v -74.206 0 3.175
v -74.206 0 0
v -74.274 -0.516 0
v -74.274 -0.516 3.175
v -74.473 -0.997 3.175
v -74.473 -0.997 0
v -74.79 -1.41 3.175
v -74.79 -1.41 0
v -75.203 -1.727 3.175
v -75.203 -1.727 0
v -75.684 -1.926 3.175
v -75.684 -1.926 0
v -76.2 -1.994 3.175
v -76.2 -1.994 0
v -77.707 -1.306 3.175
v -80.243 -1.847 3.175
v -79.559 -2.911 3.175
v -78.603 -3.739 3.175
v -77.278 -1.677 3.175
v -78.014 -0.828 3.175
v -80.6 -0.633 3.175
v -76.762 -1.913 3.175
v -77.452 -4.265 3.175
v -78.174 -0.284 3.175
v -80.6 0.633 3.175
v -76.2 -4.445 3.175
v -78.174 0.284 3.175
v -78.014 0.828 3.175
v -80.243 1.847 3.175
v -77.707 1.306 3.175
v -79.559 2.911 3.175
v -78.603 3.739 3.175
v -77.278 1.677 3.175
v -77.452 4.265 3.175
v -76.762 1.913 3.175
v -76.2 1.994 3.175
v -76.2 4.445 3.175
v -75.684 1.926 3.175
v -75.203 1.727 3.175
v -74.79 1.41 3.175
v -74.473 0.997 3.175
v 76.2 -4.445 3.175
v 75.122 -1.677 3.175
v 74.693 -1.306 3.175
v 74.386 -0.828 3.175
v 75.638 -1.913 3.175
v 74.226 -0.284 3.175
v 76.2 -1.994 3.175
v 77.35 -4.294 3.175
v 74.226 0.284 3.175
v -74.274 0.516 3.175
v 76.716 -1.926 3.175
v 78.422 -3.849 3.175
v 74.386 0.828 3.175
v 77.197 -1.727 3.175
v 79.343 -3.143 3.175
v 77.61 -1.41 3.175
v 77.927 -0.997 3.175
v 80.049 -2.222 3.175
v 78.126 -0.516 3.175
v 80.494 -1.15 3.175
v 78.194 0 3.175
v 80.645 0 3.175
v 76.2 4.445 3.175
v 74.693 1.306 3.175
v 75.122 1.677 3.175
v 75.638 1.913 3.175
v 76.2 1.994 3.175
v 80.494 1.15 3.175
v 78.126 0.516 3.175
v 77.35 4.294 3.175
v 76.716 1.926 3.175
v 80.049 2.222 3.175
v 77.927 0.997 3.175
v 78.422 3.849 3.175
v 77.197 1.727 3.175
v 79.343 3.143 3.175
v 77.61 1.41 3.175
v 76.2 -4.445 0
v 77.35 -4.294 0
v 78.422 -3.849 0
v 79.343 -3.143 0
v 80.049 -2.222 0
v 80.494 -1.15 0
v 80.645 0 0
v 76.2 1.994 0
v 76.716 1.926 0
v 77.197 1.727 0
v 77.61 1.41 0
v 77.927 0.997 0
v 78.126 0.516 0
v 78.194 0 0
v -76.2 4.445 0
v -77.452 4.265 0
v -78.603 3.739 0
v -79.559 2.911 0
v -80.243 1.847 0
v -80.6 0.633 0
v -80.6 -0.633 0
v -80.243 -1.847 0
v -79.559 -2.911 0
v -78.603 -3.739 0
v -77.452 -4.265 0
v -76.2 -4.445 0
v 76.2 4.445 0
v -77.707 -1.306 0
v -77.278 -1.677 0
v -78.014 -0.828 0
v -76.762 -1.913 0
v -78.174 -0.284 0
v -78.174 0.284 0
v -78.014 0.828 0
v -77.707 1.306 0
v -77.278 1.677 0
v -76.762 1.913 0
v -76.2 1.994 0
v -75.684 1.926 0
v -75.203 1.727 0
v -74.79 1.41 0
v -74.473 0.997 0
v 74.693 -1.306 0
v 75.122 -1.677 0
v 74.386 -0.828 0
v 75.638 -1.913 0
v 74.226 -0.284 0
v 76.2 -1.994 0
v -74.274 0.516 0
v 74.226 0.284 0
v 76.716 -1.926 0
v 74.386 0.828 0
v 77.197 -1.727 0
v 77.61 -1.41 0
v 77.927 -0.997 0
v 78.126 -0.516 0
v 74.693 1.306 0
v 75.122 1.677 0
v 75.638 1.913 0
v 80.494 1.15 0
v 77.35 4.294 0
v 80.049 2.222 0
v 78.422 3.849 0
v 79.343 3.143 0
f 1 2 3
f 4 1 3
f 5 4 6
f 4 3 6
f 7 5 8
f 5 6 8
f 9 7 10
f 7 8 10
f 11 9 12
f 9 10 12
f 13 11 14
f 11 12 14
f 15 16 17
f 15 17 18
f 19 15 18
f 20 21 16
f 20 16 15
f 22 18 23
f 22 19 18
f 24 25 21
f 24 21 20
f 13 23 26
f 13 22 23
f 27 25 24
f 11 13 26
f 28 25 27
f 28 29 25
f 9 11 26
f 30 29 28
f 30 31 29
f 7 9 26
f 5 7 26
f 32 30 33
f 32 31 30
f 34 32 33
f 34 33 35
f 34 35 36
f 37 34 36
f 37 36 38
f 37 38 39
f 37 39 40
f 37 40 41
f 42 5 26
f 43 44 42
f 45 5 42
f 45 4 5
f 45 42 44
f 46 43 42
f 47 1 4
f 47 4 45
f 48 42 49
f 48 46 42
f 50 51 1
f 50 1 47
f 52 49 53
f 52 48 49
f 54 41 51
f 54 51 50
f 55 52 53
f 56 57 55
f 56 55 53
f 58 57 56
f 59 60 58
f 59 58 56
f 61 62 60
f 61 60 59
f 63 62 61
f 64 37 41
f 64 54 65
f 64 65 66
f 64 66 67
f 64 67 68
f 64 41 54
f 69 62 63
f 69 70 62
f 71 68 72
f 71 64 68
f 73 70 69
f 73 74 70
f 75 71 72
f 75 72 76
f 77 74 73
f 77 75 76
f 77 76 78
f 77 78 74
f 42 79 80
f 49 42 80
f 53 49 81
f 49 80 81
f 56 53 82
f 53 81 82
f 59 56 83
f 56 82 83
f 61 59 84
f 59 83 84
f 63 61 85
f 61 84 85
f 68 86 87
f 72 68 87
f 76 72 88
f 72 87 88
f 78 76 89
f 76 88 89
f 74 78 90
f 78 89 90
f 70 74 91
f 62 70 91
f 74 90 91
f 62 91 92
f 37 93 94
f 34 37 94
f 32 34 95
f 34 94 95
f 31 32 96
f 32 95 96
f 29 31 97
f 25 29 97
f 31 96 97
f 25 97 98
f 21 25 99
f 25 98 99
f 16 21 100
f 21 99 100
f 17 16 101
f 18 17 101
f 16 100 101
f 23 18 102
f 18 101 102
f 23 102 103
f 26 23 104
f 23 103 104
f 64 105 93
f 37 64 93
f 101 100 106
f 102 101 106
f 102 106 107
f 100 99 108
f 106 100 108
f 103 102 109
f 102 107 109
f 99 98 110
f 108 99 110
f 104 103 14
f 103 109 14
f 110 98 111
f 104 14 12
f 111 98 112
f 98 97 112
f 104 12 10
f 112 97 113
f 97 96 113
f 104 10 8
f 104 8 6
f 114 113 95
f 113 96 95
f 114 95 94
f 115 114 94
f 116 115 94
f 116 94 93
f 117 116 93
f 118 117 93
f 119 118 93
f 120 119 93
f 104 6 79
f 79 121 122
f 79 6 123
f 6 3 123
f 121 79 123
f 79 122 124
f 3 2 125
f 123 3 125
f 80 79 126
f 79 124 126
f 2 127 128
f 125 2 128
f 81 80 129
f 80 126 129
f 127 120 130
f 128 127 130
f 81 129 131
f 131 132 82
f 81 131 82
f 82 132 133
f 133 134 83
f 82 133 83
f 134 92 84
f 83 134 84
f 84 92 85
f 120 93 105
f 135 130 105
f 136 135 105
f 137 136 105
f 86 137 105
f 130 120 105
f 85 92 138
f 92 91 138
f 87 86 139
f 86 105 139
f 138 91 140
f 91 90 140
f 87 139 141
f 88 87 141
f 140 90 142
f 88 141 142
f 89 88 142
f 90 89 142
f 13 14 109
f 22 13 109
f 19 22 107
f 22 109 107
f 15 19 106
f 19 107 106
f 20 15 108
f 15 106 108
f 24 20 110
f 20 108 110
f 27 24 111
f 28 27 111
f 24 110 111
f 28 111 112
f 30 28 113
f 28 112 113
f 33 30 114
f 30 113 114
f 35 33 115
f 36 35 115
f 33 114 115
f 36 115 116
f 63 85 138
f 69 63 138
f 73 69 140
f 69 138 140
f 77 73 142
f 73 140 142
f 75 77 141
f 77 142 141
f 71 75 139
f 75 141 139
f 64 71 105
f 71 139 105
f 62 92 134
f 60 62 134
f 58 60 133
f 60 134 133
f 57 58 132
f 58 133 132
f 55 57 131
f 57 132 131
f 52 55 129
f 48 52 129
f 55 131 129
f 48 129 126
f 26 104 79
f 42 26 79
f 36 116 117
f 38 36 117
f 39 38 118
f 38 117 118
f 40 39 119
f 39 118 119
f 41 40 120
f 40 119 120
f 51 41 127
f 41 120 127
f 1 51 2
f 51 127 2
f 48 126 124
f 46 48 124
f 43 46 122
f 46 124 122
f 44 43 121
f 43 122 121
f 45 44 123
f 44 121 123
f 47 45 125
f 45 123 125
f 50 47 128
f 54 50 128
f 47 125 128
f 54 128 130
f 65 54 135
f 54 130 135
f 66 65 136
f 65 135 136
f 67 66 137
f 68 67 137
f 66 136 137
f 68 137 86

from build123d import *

# Parameters (mm, degrees)
BOSS_EXTRUDE1_DEPTH = 3.175


with BuildPart() as part:
    # Sketch1 → Boss-Extrude1 (new body)
    with BuildSketch(Plane.XY):
        with BuildLine():
            Line((76.2, 4.445), (-76.2, 4.445))
            ThreePointArc((-76.2, 4.445), (-73.056910358, 3.143089642), (-71.755, 0))
            ThreePointArc((-71.755, 0), (-73.056910358, -3.143089642), (-76.2, -4.445))
            Line((-76.2, -4.445), (76.2, -4.445))
            ThreePointArc((76.2, -4.445), (71.755, 0), (76.2, 4.445))
        make_face()
        with BuildLine():
            ThreePointArc((-71.755, 0), (-73.056910358, 3.143089642), (-76.2, 4.445))
            Line((-76.2, 4.445), (-76.2, 1.9939))
            ThreePointArc((-76.2, 1.9939), (-74.790099789, 1.409900211), (-74.2061, 0))
            ThreePointArc((-74.2061, 0), (-74.790099789, -1.409900211), (-76.2, -1.9939))
            Line((-76.2, -1.9939), (-76.2, -4.445))
            ThreePointArc((-76.2, -4.445), (-73.056910358, -3.143089642), (-71.755, 0))
        make_face()
        with BuildLine():
            Line((-76.2, 1.9939), (-76.2, 4.445))
            ThreePointArc((-76.2, 4.445), (-80.645, 0), (-76.2, -4.445))
            Line((-76.2, -4.445), (-76.2, -1.9939))
            ThreePointArc((-76.2, -1.9939), (-78.1939, 0), (-76.2, 1.9939))
        make_face()
        with BuildLine():
            ThreePointArc((80.645, 0), (79.343089642, 3.143089642), (76.2, 4.445))
            Line((76.2, 4.445), (76.2, 1.9939))
            ThreePointArc((76.2, 1.9939), (77.609900211, 1.409900211), (78.1939, 0))
            ThreePointArc((78.1939, 0), (77.609900211, -1.409900211), (76.2, -1.9939))
            Line((76.2, -1.9939), (76.2, -4.445))
            ThreePointArc((76.2, -4.445), (79.343089642, -3.143089642), (80.645, 0))
        make_face()
        with BuildLine():
            Line((76.2, 1.9939), (76.2, 4.445))
            ThreePointArc((76.2, 4.445), (71.755, 0), (76.2, -4.445))
            Line((76.2, -4.445), (76.2, -1.9939))
            ThreePointArc((76.2, -1.9939), (74.2061, 0), (76.2, 1.9939))
        make_face()
    extrude(amount=BOSS_EXTRUDE1_DEPTH)


solid = part.part
